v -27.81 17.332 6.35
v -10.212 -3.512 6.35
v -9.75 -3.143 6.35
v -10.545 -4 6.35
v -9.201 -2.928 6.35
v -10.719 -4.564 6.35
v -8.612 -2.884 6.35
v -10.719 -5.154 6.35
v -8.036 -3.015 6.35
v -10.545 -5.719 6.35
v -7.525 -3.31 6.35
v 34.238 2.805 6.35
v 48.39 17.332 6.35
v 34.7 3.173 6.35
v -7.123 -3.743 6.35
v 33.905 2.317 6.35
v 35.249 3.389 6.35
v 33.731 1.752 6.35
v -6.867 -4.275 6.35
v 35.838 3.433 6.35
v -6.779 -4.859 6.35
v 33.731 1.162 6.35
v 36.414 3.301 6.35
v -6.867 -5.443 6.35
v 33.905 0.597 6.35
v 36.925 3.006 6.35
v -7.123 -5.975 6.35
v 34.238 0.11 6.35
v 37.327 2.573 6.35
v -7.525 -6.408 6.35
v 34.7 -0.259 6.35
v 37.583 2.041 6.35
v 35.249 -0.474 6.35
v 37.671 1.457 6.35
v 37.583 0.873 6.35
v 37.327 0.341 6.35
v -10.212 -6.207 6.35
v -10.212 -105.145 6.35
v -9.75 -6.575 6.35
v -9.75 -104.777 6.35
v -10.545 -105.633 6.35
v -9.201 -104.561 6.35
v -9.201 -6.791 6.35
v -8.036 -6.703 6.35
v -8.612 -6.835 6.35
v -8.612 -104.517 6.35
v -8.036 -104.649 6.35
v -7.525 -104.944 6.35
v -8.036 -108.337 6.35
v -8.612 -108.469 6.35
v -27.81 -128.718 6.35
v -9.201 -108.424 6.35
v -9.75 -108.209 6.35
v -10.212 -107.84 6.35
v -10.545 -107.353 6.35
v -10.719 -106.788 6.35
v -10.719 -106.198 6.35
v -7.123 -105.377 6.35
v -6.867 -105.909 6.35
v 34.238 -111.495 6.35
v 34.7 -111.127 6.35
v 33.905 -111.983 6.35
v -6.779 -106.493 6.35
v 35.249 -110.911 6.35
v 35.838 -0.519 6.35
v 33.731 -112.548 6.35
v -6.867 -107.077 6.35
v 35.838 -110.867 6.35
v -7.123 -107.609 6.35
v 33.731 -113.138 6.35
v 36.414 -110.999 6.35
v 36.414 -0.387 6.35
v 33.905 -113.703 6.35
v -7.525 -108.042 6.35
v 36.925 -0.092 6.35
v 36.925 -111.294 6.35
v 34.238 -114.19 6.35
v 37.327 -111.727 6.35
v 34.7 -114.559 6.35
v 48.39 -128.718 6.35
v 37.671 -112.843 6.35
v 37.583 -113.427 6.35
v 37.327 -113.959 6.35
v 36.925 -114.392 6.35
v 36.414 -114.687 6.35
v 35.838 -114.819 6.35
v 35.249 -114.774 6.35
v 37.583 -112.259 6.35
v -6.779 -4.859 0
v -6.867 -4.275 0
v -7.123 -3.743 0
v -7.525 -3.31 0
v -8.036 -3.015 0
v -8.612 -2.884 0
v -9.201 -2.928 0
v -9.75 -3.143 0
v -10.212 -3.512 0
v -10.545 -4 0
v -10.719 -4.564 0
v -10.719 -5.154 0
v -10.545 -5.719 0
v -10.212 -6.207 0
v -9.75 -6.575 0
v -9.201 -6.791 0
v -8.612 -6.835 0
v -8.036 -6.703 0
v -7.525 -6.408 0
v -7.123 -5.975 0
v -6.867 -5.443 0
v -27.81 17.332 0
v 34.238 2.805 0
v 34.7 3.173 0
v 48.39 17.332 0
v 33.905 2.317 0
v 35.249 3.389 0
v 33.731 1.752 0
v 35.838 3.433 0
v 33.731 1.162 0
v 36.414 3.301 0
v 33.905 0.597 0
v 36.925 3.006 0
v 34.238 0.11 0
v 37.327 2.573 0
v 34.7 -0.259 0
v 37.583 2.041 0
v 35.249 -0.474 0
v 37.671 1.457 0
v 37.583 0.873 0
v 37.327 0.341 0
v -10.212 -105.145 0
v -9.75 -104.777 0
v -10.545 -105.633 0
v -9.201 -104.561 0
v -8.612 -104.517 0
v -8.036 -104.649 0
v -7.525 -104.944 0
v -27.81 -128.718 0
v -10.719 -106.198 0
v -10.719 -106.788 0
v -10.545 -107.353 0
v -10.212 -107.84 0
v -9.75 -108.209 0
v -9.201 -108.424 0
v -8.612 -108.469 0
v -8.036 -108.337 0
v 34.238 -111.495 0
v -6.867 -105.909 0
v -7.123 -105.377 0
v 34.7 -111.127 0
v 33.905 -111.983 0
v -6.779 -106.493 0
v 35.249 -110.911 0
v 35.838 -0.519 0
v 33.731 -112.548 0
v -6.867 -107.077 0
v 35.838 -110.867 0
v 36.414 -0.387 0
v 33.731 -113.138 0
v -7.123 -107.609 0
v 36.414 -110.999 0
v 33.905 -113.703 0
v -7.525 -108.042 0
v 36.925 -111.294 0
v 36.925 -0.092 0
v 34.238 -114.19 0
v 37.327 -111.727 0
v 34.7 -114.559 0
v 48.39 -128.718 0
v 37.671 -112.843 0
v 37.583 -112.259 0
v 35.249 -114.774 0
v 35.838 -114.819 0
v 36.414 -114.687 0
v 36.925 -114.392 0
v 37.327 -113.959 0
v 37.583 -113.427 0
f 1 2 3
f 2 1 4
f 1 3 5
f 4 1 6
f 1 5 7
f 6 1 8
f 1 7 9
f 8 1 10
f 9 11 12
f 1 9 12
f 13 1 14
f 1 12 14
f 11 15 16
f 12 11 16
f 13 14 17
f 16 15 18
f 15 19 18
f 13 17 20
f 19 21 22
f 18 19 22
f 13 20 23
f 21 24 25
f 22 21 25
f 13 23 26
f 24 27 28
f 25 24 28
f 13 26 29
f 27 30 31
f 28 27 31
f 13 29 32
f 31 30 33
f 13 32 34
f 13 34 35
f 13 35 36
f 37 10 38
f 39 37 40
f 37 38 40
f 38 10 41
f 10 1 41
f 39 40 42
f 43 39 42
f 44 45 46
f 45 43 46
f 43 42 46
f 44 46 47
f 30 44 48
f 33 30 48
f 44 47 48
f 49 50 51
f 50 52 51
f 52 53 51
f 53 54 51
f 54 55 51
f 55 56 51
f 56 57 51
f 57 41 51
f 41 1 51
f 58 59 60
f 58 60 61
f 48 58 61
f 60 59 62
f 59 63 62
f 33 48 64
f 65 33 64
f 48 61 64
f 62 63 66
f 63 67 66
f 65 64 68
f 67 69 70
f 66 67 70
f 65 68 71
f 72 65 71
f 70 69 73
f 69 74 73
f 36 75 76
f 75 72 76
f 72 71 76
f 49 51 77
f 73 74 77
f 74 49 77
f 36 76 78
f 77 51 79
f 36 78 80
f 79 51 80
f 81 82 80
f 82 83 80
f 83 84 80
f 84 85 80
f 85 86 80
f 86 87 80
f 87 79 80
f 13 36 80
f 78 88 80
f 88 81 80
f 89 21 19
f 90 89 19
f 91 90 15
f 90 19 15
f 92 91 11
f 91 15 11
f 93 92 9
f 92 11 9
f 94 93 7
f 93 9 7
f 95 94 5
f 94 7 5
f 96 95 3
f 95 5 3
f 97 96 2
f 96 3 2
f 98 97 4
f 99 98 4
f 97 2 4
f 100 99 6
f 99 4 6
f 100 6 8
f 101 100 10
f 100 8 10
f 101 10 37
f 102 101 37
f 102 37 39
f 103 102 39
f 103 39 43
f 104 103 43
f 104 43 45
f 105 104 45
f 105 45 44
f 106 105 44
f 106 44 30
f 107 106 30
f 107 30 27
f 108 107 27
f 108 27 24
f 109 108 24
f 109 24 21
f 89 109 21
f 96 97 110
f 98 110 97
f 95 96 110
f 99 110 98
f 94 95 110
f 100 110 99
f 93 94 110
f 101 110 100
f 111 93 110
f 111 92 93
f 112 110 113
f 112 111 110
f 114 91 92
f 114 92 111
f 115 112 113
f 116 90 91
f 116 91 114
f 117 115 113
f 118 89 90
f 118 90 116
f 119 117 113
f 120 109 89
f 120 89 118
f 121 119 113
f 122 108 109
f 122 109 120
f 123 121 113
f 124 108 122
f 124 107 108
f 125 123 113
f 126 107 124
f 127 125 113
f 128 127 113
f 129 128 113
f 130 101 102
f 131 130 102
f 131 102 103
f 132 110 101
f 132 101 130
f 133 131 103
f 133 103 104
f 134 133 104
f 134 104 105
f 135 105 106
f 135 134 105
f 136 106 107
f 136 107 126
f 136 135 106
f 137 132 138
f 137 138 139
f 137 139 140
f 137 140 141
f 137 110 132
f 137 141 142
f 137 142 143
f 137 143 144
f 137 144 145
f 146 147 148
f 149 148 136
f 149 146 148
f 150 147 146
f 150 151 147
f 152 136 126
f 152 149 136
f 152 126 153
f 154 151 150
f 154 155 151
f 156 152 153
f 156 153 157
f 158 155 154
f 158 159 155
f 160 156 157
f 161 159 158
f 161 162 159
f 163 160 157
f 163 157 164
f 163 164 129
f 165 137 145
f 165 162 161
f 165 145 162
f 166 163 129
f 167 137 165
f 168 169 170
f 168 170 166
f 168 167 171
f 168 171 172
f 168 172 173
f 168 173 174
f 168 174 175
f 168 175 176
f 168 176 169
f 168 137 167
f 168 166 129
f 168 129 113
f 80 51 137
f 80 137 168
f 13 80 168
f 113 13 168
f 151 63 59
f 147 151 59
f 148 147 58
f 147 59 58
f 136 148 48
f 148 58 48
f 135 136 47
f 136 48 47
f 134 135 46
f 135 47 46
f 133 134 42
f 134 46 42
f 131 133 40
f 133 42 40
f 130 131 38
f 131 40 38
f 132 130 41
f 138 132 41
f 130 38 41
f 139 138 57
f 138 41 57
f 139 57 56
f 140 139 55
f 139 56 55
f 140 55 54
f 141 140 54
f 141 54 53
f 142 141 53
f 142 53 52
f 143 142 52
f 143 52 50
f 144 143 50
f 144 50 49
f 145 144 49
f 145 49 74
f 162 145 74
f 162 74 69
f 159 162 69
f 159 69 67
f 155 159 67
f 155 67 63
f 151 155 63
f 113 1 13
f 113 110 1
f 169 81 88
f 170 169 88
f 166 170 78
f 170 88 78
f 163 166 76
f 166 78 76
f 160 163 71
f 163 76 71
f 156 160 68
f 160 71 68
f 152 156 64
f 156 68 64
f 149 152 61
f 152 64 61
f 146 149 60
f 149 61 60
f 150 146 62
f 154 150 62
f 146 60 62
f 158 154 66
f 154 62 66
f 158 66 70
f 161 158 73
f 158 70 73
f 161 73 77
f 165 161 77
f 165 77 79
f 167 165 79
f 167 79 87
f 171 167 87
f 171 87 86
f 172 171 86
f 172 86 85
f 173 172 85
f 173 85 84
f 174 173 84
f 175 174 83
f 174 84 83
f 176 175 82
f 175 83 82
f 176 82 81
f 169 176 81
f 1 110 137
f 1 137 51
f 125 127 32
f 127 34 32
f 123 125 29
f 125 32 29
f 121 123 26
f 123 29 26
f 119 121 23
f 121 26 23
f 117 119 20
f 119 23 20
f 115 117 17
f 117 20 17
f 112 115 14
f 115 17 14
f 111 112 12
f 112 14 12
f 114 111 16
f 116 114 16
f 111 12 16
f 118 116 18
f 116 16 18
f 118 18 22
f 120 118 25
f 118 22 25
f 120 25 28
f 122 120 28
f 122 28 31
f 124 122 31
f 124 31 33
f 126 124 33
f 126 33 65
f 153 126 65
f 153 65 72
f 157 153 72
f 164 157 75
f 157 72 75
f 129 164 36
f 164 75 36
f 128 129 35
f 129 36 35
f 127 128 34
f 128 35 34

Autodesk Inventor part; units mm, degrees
ref_plane "YZ Plane" through (0, 0, 0) normal (1, 0, 0) x (0, 1, 0)
ref_plane "XZ Plane" through (0, 0, 0) normal (0, 1, 0) x (-1, 0, 0)
ref_plane "XY Plane" through (0, 0, 0) normal (0, 0, 1) x (1, 0, 0)
sketch "Sketch1" plane through (0, 0, 0) normal (0, 0, 1) x (1, 0, 0)
  line L0 (-27.8098, 14.1571) -> (47.1902, 14.1571)
  line L1 (47.1902, 14.1571) -> (47.1902, -138.2429)
  line L2 (47.1902, -138.2429) -> (-27.8098, -138.2429)
  line L3 (-27.8098, -138.2429) -> (-27.8098, 14.1571)
  point P0 (0, 0)
  dimension "d0" = 75
  dimension "d1" = 152.4
extrude "Extrusion1" add sketch "Sketch1" along normal blind 6.35
sketch "Sketch2" plane through (0, 0, 6.35) normal (0, 0, 1) x (1, 0, 0)
  line L0 (47.1902, 14.1571) -> (47.1902, -138.2429) projected
  line L1 (-27.8098, -138.2429) -> (47.1902, -138.2429)
  line L2 (47.1902, -138.2429) -> (47.1902, -125.5429)
  line L3 (47.1902, -125.5429) -> (-27.8098, -125.5429)
  line L4 (-27.8098, -125.5429) -> (-27.8098, -138.2429)
  point P0 (0, 0)
  dimension "d4" = 12.7
extrude "Extrusion2" cut sketch "Sketch2" against normal blind 25.4
sketch "Sketch3" plane through (0, 0, 6.35) normal (0, 0, 1) x (1, 0, 0)
  line L0 (47.1902, -125.5429) -> (34.4902, -125.5429)
  line L1 (34.4902, -125.5429) -> (34.4902, -112.8429)
  line L2 (34.4902, -112.8429) -> (47.1902, -112.8429)
  line L3 (47.1902, -112.8429) -> (47.1902, -125.5429)
  line L4 (-27.8098, -125.5429) -> (-8.7598, -125.5429)
  line L5 (-8.7598, -125.5429) -> (-8.7598, -106.4929)
  line L6 (-8.7598, -106.4929) -> (-27.8098, -106.4929)
  line L7 (-27.8098, -106.4929) -> (-27.8098, -125.5429)
  line L8 (-27.8098, 14.1571) -> (-8.7598, 14.1571)
  line L9 (-8.7598, 14.1571) -> (-8.7598, -4.8592)
  line L10 (-8.7598, -4.8592) -> (-27.8098, -4.8592)
  line L11 (-27.8098, -4.8592) -> (-27.8098, 14.1571)
  line L12 (47.1902, 14.1571) -> (34.4902, 14.1571)
  line L13 (34.4902, 14.1571) -> (34.4902, 1.4571)
  line L14 (34.4902, 1.4571) -> (47.1902, 1.4571)
  line L15 (47.1902, 1.4571) -> (47.1902, 14.1571)
  circle A0 centre (-8.7598, -106.4929) radius 1.9812
  circle A1 centre (-8.7598, -4.8592) radius 1.9812
  circle A2 centre (34.4902, 1.4571) radius 1.9812
  circle A3 centre (34.4902, -112.8429) radius 1.9812
  point P0 (0, 0)
  dimension "d7" = 12.7
  dimension "d8" = 12.7
  dimension "d9" = 19.05
  dimension "d10" = 19.05
  dimension "d11" = 19.05
  dimension "d12" = 12.7
  dimension "d13" = 12.7
  dimension "d14" = 3.9624
  dimension "d15" = 3.9624
extrude "Extrusion3" cut sketch "Sketch3" against normal blind 25.4 contours A3 L2 L1 | L1 L2 A3 | A0 L6 L5 | L5 L6 A0 | A1 L10 L9 | L9 L10 A1 | A2 L14 L13 | L13 L14 A2
sketch "Sketch4" plane through (0, 0, 6.35) normal (0, 0, 1) x (1, 0, 0)
  circle A0 centre (34.4902, -112.8429) radius 1.9812 projected
  circle A1 centre (34.4902, 1.4571) radius 1.9812 projected
  point P0 (0, 0)
extrude "Extrusion4" add sketch "Sketch4" against normal blind 6.35
sketch "Sketch5" plane through (-27.8098, 14.1571, 0) normal (-1, 0, 0) x (0, 0, 1)
  line L0 (0, -139.7) -> (0, 0) projected
  line L1 (6.35, 0) -> (0, 0)
  line L2 (0, 0) -> (0, -6.9273)
  line L3 (0, -6.9273) -> (6.35, -6.9273)
  line L4 (6.35, -6.9273) -> (6.35, 0)
  point P0 (0, -14.1571)
extrude "Extrusion5" add sketch "Sketch5" against normal blind 76.2
sketch "Sketch6" plane through (48.3902, 14.1571, 0) normal (1, 0, 0) x (0, 0, -1)
  line L0 (0, 0) -> (0, -6.9273) projected
  line L1 (-6.35, 0) -> (0, 0) projected
  line L2 (-6.35, -6.9273) -> (-6.35, 0) projected
  line L3 (0, -6.9273) -> (-6.35, -6.9273) projected
  line L4 (-6.35, 0) -> (0, 0)
  line L5 (0, 0) -> (0, -139.7)
  line L6 (0, -139.7) -> (-6.35, -139.7)
  line L7 (-6.35, -139.7) -> (-6.35, 0)
  point P0 (0, -14.1571)
  dimension "d22" = 139.7
extrude "Extrusion6" add sketch "Sketch6" against normal blind 2.54 contours L5 L6 L7 L3
sketch "Sketch7" plane through (0, 0, 6.35) normal (0, 0, 1) x (1, 0, 0)
  line L0 (48.3902, -125.5429) -> (35.6902, -125.5429)
  line L1 (35.6902, -125.5429) -> (35.6902, -112.8429)
  line L2 (35.6902, -112.8429) -> (48.3902, -112.8429)
  line L3 (48.3902, -112.8429) -> (48.3902, -125.5429)
  line L4 (48.3902, 14.1571) -> (35.6902, 14.1571)
  line L5 (35.6902, 14.1571) -> (35.6902, 1.4571)
  line L6 (35.6902, 1.4571) -> (48.3902, 1.4571)
  line L7 (48.3902, 1.4571) -> (48.3902, 14.1571)
  circle A0 centre (35.6902, -112.8429) radius 1.9812
  circle A1 centre (35.6902, 1.4571) radius 1.9812
  point P0 (0, 0)
  dimension "d25" = 12.7
  dimension "d26" = 12.7
  dimension "d27" = 12.7
  dimension "d28" = 12.7
  dimension "d29" = 3.9624
  dimension "d30" = 3.9624
extrude "Extrusion7" cut sketch "Sketch7" against normal blind 25.4 contours A0 L2 L1 | L1 L2 A0 | A1 L6 L5 | L5 L6 A1
sketch "Sketch8" plane through (-27.8098, -125.5429, 0) normal (0, -1, 0) x (1, 0, 0)
  line L0 (0, 6.35) -> (76.2, 6.35) projected
  line L1 (0, 0) -> (0, 6.35) projected
  line L2 (76.2, 0) -> (0, 0) projected
  line L3 (76.2, 6.35) -> (76.2, 0) projected
  point P0 (27.8098, 0)
extrude "Extrusion8" add sketch "Sketch8" along normal blind 3.175
sketch "Sketch9" plane through (-27.8098, 14.1571, 6.35) normal (0, 1, 0) x (1, 0, 0)
  line L0 (0, 0) -> (76.2, 0) projected
  line L1 (76.2, 0) -> (76.2, 6.35) projected
  line L2 (0, 6.35) -> (76.2, 6.35) projected
  line L3 (0, 6.35) -> (0, 0) projected
  point P0 (27.8098, 6.35)
extrude "Extrusion9" add sketch "Sketch9" along normal blind 3.175
properties part number "bottombase"
